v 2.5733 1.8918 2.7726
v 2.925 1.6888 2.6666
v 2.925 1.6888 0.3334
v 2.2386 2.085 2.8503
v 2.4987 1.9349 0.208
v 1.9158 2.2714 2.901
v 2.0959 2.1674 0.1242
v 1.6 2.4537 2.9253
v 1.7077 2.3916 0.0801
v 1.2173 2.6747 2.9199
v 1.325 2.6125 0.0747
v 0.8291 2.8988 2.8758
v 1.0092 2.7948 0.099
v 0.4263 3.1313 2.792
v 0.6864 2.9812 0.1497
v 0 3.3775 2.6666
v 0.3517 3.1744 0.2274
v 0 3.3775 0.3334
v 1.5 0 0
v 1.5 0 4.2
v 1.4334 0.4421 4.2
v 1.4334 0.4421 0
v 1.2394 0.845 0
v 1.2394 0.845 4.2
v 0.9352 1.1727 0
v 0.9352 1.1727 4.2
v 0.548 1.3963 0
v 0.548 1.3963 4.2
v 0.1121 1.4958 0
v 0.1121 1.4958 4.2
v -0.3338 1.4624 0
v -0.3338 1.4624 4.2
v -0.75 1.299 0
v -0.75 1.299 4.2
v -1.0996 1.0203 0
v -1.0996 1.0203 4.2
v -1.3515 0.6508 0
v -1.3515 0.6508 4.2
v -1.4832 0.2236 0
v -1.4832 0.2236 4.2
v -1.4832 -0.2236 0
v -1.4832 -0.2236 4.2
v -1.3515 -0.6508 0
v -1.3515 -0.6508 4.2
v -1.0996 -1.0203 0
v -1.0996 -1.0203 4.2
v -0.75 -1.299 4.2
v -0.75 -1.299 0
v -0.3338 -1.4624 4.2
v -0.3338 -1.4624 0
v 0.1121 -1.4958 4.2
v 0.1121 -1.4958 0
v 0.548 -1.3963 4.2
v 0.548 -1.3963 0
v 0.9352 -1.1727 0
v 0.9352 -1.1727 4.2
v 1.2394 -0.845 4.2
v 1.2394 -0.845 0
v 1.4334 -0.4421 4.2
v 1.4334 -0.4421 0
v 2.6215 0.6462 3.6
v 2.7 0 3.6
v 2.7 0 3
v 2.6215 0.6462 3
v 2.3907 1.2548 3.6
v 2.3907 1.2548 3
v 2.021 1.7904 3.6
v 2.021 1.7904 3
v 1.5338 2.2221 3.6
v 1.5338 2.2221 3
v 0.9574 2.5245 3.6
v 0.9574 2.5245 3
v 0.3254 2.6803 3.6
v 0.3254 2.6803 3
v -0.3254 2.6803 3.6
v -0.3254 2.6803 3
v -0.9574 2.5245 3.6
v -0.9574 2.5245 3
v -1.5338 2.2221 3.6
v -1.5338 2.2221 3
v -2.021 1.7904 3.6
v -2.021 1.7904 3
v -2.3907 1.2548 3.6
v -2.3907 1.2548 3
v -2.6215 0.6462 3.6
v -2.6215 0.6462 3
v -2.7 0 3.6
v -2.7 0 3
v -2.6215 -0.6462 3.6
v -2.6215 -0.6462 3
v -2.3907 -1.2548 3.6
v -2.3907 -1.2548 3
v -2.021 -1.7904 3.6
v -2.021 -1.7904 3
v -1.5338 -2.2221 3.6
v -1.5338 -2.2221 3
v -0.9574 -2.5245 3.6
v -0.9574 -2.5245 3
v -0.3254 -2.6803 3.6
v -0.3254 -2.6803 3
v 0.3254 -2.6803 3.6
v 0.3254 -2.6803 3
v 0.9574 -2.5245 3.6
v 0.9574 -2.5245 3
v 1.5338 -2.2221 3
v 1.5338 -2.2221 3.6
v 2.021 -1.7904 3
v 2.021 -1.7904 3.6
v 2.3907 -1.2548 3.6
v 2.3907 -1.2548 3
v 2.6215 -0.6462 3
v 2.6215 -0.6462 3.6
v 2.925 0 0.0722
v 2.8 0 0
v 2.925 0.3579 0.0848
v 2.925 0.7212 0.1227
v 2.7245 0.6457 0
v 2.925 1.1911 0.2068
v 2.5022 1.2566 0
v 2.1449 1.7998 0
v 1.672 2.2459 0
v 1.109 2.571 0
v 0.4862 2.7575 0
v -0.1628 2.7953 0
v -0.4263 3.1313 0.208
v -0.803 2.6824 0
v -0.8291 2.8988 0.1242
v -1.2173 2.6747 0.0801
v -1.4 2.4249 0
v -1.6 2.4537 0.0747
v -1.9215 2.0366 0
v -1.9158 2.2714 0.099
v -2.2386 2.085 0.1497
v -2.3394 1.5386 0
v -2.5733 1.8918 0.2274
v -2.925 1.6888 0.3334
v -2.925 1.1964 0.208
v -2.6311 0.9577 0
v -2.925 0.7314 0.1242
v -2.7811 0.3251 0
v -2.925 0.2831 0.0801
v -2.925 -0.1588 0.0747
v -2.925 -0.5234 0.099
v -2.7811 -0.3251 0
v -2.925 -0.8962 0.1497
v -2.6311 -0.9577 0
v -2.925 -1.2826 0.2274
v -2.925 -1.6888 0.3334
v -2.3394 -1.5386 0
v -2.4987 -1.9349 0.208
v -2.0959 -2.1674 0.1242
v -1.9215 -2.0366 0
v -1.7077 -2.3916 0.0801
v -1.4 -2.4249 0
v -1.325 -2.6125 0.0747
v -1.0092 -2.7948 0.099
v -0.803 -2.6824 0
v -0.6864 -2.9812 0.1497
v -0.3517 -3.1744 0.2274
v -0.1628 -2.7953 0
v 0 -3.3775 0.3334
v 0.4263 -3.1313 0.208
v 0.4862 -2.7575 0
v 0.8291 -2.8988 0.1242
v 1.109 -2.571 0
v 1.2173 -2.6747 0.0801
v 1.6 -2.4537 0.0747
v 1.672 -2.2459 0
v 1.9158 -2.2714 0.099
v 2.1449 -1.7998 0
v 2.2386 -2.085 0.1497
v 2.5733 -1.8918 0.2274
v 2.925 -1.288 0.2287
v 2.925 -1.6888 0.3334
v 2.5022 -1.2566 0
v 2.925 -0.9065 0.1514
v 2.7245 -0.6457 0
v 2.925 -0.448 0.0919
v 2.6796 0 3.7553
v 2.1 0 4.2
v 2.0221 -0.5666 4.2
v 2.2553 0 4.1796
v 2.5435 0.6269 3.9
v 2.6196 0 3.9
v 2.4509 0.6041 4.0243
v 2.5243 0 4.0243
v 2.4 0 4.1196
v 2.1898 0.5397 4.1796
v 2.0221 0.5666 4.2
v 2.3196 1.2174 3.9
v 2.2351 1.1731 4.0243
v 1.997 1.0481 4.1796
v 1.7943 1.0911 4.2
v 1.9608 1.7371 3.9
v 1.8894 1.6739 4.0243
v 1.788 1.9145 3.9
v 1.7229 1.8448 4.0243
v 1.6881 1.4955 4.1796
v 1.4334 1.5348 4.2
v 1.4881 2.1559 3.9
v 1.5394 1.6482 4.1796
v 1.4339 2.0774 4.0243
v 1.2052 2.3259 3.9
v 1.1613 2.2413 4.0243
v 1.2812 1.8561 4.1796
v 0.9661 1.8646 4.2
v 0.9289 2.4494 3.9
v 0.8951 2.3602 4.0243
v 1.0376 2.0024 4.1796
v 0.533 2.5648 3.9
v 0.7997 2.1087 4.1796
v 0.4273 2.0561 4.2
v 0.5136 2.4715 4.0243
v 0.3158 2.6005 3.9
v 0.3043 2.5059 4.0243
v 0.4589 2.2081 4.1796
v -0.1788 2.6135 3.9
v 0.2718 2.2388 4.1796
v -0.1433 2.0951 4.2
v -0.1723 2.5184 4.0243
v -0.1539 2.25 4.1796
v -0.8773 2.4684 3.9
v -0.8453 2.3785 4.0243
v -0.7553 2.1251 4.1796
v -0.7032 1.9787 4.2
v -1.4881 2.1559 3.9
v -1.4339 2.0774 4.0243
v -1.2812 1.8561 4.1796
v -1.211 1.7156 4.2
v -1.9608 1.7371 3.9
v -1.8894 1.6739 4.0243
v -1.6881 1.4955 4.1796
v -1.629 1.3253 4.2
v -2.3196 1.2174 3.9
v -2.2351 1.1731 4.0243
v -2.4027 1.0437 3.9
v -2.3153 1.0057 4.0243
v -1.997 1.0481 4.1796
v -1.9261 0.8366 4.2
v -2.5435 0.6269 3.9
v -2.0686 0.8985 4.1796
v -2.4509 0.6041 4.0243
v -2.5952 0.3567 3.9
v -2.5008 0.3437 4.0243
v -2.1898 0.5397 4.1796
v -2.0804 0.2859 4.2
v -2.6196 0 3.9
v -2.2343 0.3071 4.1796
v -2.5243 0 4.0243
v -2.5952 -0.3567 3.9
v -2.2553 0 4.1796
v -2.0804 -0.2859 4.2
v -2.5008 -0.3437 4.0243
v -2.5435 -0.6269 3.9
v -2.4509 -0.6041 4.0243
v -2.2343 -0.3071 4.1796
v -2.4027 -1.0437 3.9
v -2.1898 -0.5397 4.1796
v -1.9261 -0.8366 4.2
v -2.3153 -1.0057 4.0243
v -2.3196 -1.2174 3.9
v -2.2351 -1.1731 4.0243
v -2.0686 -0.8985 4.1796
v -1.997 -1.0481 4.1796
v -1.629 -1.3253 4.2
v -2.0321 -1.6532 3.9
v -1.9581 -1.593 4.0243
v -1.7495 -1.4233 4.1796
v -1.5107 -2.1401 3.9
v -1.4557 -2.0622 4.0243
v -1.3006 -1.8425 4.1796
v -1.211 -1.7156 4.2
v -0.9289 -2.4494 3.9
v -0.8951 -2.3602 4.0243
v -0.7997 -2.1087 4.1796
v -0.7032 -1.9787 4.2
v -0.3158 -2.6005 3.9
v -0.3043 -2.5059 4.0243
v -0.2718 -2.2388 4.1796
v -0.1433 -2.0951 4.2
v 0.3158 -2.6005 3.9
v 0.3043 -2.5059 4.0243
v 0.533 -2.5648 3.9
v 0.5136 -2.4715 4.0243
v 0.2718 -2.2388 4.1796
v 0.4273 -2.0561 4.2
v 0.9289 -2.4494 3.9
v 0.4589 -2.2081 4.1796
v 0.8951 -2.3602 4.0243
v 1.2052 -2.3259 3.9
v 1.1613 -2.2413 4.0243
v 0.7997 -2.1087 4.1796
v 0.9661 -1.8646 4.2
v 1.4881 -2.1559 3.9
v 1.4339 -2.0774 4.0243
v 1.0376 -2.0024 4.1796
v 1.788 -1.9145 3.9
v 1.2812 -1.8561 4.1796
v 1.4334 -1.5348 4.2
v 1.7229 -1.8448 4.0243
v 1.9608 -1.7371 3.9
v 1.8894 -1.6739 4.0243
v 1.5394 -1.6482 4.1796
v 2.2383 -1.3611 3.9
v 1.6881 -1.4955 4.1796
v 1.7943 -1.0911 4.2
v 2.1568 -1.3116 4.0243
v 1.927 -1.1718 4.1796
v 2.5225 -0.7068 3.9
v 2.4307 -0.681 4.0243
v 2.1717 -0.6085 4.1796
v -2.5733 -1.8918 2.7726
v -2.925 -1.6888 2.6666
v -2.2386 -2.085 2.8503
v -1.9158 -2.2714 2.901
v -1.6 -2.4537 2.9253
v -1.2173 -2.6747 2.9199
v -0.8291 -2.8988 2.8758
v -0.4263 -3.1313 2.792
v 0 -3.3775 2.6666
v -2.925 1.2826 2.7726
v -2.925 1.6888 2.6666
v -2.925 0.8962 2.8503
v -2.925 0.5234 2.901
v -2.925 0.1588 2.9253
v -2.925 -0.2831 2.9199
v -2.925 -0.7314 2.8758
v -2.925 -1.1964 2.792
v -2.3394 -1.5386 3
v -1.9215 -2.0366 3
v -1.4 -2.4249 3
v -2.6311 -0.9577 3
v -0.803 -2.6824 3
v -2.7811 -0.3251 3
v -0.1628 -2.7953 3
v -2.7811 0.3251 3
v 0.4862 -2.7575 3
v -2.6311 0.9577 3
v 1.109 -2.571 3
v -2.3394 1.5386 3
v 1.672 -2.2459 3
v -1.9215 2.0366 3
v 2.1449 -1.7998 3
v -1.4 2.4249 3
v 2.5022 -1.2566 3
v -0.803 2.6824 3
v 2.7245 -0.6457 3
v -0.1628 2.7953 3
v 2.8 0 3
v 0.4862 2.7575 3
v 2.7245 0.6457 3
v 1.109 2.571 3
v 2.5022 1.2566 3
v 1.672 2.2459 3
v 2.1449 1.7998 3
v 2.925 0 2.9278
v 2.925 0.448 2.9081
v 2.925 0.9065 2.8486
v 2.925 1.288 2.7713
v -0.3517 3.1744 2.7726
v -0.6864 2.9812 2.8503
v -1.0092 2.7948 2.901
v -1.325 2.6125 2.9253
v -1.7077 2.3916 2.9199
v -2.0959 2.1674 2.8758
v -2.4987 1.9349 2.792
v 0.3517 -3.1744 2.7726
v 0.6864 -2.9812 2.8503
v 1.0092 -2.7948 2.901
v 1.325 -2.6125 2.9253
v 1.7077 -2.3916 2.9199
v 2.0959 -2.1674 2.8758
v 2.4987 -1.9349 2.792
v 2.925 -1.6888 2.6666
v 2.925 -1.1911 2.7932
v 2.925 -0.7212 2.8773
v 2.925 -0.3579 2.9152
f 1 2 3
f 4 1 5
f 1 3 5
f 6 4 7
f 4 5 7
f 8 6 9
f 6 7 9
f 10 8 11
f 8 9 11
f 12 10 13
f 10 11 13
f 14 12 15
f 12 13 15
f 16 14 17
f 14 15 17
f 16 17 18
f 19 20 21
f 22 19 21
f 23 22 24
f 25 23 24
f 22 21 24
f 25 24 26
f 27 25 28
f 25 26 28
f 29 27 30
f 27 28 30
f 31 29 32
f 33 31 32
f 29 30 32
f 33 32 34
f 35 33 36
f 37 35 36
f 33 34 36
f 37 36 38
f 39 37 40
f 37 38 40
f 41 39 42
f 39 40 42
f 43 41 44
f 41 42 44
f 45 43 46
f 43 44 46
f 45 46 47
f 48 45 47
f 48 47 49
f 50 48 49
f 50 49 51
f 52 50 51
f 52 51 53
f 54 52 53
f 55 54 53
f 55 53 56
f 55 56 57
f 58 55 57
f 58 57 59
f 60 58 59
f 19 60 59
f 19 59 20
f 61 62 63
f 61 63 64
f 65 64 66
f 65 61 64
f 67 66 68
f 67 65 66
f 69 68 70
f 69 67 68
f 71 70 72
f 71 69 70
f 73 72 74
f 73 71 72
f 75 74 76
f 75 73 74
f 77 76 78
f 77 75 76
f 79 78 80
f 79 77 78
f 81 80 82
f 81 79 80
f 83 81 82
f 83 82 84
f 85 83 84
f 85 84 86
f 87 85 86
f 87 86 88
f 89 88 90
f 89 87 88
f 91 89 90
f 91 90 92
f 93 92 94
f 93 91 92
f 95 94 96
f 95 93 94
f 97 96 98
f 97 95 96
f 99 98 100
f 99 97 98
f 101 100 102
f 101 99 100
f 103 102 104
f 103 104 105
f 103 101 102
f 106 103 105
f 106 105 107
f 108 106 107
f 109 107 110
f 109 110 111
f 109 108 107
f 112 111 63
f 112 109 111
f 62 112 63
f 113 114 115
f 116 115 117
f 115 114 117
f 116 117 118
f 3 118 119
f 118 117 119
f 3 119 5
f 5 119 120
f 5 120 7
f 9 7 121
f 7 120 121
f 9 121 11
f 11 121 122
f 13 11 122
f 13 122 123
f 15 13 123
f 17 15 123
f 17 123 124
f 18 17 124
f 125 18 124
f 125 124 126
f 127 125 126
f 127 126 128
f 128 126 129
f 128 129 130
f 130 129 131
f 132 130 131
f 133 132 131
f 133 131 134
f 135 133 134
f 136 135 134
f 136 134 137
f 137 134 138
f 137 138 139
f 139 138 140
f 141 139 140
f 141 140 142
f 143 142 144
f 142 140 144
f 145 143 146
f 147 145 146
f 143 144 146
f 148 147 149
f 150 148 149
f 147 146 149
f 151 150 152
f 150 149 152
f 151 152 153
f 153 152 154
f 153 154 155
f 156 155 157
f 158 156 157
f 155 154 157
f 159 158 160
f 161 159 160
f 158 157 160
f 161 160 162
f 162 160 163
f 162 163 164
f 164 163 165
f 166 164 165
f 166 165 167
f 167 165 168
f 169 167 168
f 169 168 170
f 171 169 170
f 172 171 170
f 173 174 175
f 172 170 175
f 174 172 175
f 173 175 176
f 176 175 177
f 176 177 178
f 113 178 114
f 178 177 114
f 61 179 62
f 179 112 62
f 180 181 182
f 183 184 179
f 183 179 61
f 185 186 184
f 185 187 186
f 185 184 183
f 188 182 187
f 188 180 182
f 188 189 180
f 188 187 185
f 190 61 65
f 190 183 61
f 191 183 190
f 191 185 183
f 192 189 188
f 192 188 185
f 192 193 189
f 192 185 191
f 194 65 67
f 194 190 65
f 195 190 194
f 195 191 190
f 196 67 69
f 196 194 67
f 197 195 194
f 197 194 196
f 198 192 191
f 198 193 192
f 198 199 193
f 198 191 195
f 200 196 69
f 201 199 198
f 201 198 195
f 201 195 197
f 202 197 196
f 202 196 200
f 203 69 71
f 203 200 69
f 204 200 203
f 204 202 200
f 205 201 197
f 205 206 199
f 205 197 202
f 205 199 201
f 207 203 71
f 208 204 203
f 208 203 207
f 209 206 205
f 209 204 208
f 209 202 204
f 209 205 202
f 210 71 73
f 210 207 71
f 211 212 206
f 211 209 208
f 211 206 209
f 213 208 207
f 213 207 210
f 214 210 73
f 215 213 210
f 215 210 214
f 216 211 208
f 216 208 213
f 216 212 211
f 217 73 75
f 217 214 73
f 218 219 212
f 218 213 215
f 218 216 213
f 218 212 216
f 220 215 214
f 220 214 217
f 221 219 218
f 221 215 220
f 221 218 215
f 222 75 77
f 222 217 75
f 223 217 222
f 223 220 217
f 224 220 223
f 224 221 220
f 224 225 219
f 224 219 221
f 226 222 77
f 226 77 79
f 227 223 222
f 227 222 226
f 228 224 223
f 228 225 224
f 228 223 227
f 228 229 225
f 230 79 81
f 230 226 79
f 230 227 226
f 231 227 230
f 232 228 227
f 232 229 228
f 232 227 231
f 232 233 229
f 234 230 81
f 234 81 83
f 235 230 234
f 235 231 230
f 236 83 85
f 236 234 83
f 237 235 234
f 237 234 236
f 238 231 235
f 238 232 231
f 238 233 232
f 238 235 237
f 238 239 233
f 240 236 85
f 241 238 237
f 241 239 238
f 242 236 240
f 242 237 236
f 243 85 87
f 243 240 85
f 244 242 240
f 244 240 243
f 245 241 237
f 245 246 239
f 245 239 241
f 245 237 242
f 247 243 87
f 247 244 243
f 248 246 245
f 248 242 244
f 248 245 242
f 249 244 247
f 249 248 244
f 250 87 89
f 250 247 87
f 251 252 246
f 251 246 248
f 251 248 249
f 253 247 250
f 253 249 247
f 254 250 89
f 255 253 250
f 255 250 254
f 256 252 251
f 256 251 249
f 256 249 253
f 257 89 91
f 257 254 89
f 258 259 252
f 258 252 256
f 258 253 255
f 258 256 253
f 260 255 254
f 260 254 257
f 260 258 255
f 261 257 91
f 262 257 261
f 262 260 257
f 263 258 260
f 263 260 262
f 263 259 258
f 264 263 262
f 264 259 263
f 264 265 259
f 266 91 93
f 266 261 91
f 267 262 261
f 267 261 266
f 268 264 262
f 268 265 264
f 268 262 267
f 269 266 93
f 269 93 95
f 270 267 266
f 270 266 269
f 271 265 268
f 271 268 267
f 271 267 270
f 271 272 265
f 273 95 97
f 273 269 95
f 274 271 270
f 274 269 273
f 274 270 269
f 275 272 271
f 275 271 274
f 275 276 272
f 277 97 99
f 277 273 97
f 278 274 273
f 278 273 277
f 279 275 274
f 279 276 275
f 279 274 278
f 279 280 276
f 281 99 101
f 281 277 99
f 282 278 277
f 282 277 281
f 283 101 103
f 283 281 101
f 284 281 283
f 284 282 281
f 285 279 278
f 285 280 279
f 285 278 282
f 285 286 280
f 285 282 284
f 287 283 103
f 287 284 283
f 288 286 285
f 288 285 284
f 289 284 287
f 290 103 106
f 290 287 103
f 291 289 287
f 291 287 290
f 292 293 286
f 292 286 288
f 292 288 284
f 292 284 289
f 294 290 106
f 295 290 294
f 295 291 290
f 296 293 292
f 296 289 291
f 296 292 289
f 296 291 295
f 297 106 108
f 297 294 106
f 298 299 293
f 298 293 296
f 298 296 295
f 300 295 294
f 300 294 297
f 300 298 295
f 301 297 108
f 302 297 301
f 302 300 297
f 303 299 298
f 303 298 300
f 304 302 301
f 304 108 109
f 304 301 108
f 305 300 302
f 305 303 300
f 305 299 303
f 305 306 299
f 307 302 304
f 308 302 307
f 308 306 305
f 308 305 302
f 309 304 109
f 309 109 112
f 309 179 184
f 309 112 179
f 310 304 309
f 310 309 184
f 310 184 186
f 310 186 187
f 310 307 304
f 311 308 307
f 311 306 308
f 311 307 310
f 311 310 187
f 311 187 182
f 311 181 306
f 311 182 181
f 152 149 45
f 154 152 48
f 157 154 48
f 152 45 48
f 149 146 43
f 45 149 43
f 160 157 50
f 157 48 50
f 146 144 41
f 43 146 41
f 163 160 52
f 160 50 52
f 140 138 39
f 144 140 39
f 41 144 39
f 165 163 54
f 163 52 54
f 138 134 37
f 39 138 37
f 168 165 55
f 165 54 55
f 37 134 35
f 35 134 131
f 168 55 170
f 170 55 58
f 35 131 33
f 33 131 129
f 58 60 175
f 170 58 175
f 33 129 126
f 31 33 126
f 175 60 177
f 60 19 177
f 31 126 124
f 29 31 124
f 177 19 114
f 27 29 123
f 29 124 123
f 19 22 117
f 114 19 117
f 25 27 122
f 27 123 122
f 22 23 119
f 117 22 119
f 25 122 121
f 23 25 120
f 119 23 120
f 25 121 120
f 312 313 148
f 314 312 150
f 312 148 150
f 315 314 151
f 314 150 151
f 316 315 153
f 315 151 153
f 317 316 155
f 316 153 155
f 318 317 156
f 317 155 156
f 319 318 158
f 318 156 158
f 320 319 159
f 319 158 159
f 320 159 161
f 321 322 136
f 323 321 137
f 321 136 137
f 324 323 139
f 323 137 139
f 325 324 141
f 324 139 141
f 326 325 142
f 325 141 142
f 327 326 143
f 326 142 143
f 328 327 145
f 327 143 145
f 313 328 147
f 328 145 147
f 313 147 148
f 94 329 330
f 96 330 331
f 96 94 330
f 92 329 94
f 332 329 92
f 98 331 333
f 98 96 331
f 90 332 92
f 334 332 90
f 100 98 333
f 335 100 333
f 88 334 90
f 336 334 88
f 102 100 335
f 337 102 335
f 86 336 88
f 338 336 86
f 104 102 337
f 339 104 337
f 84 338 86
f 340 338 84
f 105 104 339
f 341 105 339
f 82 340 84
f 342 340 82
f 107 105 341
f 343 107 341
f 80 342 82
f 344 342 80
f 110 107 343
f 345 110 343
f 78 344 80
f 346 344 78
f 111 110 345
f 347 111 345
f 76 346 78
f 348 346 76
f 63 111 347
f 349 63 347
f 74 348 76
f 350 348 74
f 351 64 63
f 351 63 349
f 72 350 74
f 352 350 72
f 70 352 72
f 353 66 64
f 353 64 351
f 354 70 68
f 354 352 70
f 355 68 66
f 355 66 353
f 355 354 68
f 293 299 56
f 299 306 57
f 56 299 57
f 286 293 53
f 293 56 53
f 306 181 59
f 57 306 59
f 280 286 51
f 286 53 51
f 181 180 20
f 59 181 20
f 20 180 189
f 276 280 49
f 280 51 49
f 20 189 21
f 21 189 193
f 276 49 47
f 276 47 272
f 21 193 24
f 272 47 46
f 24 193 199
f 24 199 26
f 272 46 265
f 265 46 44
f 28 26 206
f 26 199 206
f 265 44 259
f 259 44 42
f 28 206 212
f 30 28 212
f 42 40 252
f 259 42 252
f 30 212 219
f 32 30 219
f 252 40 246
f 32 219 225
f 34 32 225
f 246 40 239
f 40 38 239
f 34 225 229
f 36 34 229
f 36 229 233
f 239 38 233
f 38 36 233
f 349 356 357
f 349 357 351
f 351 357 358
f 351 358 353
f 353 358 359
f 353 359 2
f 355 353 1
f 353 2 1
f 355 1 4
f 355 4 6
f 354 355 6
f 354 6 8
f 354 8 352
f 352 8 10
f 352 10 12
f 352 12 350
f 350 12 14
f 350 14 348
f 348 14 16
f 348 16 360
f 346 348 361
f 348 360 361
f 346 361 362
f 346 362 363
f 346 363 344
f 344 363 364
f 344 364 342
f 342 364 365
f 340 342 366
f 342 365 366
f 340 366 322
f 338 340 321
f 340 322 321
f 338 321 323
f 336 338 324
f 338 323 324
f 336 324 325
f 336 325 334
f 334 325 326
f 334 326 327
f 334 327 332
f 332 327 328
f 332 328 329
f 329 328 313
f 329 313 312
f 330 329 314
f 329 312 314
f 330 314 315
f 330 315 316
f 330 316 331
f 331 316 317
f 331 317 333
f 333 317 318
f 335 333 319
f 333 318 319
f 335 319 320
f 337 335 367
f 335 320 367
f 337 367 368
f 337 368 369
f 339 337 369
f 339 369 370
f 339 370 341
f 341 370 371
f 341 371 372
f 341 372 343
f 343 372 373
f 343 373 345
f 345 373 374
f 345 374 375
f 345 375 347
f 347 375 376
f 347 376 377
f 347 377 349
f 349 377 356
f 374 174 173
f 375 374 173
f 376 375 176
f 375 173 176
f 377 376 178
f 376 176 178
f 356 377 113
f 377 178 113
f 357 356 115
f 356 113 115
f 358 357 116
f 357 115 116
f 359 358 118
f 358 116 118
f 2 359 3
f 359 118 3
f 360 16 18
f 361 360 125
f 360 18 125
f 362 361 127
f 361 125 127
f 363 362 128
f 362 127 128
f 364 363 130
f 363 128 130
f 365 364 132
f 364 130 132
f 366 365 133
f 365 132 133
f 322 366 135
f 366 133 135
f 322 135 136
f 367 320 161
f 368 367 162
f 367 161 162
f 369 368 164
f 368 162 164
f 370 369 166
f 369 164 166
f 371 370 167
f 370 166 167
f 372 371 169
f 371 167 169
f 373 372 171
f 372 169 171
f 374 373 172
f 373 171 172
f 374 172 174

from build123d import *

# Parameters (mm, degrees)
F0_R     = 1.5
F1_DEPTH = 3
F4_W     = 1.2
F4_H     = 1.2
F6_R     = 0.6


with BuildPart() as f1:
    # F0 (on Top) → F1 (new body)
    with BuildSketch(Plane.XY):
        Polygon((2.925, -1.68875), (2.925, 1.68875), (0, 3.377499), (-2.925, 1.68875), (-2.925, -1.68875), (0, -3.377499), align=None)
        Circle(F0_R, mode=Mode.SUBTRACT)
    extrude(amount=F1_DEPTH)

    # F2 (on Front) → F3 (revolve, cut)
    with BuildSketch(Plane.XZ):
        Polygon((4.878461, 3), (2.8, 3), (4.878461, 1.8), align=None)
        Polygon((2.8, 0), (4.878461, 0), (4.878461, 1.2), align=None)
    revolve(axis=Axis((0, 0, 1.5), (0, 0, 1)), mode=Mode.SUBTRACT)

    # F4 (on Front) → F5 (revolve)
    with BuildSketch(Plane.XZ):
        with Locations((2.1, 3.6)):
            Rectangle(F4_W, F4_H)
    revolve(axis=Axis((0, 0, 1.5), (0, 0, 1)))

    # F6
    f6_edges = [f1.edges().sort_by_distance(p)[0] for p in [
        (-2.7, 0, 4.2),
    ]]
    fillet(f6_edges, radius=F6_R)


solid = f1.part
